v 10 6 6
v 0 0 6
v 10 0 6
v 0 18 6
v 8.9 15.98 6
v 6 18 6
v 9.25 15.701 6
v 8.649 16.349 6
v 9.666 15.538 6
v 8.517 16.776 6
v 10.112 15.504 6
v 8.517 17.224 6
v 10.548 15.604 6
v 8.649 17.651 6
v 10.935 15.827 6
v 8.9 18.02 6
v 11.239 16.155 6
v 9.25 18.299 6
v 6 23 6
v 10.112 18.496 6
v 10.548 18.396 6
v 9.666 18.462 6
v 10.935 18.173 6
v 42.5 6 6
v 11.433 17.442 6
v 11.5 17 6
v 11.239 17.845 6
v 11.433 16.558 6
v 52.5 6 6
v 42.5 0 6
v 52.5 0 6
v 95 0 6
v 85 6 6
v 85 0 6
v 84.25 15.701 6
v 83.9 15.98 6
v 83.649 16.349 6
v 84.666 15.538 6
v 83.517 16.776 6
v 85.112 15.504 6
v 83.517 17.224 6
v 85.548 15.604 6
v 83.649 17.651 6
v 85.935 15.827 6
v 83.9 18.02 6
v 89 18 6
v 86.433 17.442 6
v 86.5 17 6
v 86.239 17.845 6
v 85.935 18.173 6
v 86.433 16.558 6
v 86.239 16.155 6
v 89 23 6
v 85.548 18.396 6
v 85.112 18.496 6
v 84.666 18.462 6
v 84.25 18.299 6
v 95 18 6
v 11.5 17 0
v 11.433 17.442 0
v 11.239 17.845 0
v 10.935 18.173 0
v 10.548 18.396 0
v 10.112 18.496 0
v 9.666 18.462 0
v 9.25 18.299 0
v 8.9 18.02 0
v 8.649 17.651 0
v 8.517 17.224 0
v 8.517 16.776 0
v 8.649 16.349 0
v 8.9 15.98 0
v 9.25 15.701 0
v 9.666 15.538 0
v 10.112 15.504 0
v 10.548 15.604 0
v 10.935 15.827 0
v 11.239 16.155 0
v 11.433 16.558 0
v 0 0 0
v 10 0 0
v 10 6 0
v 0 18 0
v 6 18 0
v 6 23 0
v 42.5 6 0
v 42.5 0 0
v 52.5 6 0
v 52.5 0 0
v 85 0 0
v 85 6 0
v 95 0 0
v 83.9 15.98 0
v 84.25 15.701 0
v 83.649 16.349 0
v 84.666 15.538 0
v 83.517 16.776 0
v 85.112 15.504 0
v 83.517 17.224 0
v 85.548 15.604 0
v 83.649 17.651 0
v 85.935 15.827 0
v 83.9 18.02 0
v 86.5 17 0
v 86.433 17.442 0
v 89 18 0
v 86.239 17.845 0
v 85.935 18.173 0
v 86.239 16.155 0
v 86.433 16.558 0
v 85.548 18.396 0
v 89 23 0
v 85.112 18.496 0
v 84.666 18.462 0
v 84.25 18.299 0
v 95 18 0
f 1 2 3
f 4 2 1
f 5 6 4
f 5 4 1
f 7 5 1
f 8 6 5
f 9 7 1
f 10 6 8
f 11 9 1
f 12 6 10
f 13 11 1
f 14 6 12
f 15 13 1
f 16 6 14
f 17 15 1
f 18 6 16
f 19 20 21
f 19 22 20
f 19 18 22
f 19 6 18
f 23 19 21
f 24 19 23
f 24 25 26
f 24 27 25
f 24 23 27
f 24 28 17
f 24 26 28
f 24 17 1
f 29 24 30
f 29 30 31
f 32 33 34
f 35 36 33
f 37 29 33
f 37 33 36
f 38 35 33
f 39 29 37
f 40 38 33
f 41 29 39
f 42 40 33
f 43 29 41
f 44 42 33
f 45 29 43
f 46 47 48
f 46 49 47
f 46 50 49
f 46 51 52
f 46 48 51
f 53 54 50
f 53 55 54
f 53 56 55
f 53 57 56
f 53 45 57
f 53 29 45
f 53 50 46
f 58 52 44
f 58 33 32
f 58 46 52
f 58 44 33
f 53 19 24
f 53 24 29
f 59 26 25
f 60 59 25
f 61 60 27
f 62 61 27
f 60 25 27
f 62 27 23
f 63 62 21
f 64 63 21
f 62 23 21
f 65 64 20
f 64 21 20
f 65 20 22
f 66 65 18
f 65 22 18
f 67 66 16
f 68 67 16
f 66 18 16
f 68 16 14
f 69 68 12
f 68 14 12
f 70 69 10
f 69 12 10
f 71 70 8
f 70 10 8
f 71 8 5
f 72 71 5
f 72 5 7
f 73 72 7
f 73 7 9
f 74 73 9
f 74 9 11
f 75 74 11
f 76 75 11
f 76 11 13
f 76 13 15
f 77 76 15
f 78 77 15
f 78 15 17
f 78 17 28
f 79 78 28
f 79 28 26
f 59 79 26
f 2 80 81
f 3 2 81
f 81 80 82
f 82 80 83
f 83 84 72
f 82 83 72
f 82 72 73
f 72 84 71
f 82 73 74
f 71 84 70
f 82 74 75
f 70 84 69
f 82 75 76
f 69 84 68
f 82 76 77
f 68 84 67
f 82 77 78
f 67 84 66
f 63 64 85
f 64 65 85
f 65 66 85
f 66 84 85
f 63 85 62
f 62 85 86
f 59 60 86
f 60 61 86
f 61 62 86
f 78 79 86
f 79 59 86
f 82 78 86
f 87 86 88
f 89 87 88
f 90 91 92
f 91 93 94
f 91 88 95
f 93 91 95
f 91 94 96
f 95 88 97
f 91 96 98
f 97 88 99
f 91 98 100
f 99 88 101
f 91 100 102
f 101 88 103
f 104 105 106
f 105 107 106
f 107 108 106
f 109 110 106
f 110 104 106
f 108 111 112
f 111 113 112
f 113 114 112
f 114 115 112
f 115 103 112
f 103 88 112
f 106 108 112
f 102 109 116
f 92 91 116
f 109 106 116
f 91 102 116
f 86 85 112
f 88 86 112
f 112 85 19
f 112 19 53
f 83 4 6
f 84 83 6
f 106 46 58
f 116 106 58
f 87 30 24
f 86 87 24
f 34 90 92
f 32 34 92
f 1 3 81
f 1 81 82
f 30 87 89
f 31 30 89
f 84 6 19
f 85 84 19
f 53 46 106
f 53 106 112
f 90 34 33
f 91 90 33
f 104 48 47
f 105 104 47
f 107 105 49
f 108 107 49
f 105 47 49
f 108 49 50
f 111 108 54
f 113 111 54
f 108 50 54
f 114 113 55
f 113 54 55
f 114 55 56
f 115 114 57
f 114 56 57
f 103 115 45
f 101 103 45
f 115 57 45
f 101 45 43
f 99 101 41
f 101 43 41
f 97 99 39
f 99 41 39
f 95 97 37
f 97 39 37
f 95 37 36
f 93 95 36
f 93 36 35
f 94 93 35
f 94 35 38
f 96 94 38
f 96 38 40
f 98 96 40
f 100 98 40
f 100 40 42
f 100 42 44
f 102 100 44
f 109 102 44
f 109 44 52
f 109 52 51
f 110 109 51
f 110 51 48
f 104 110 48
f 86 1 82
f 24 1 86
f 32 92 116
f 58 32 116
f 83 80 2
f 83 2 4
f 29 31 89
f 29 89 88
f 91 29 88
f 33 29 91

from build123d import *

# Parameters (mm, degrees)
SKETCH1_W           = 95
SKETCH1_H           = 23
BOSS_EXTRUDE1_DEPTH = 6
SKETCH2_W           = 32.5
SKETCH2_H           = 6
CUT_EXTRUDE1_DEPTH  = 7
SKETCH4_R           = 1.5
CUT_EXTRUDE2_DEPTH  = 7
SKETCH5_W           = 6
SKETCH5_H           = 5
CUT_EXTRUDE3_DEPTH  = 7


with BuildPart() as part:
    # Sketch1 → Boss-Extrude1 (new body)
    with BuildSketch(Plane.XY):
        with Locations((47.5, 11.5)):
            Rectangle(SKETCH1_W, SKETCH1_H)
    extrude(amount=BOSS_EXTRUDE1_DEPTH)

    # Sketch2 → Cut-Extrude1 (cut, through all)
    with BuildSketch(Plane.XY.offset(6)):
        with Locations((26.25, 3)):
            Rectangle(SKETCH2_W, SKETCH2_H)
        with Locations((68.75, 3)):
            Rectangle(SKETCH2_W, SKETCH2_H)
    extrude(amount=-CUT_EXTRUDE1_DEPTH, mode=Mode.SUBTRACT)

    # Sketch4 → Cut-Extrude2 (cut, through all)
    with BuildSketch(Plane.XY.offset(6)):
        with Locations((10, 17)):
            Circle(SKETCH4_R)
        with Locations((85, 17)):
            Circle(SKETCH4_R)
    extrude(amount=-CUT_EXTRUDE2_DEPTH, mode=Mode.SUBTRACT)

    # Sketch5 → Cut-Extrude3 (cut, through all)
    with BuildSketch(Plane.XY.offset(6)):
        with Locations((3, 20.5)):
            Rectangle(SKETCH5_W, SKETCH5_H)
        with Locations((92, 20.5)):
            Rectangle(SKETCH5_W, SKETCH5_H)
    extrude(amount=-CUT_EXTRUDE3_DEPTH, mode=Mode.SUBTRACT)


solid = part.part
